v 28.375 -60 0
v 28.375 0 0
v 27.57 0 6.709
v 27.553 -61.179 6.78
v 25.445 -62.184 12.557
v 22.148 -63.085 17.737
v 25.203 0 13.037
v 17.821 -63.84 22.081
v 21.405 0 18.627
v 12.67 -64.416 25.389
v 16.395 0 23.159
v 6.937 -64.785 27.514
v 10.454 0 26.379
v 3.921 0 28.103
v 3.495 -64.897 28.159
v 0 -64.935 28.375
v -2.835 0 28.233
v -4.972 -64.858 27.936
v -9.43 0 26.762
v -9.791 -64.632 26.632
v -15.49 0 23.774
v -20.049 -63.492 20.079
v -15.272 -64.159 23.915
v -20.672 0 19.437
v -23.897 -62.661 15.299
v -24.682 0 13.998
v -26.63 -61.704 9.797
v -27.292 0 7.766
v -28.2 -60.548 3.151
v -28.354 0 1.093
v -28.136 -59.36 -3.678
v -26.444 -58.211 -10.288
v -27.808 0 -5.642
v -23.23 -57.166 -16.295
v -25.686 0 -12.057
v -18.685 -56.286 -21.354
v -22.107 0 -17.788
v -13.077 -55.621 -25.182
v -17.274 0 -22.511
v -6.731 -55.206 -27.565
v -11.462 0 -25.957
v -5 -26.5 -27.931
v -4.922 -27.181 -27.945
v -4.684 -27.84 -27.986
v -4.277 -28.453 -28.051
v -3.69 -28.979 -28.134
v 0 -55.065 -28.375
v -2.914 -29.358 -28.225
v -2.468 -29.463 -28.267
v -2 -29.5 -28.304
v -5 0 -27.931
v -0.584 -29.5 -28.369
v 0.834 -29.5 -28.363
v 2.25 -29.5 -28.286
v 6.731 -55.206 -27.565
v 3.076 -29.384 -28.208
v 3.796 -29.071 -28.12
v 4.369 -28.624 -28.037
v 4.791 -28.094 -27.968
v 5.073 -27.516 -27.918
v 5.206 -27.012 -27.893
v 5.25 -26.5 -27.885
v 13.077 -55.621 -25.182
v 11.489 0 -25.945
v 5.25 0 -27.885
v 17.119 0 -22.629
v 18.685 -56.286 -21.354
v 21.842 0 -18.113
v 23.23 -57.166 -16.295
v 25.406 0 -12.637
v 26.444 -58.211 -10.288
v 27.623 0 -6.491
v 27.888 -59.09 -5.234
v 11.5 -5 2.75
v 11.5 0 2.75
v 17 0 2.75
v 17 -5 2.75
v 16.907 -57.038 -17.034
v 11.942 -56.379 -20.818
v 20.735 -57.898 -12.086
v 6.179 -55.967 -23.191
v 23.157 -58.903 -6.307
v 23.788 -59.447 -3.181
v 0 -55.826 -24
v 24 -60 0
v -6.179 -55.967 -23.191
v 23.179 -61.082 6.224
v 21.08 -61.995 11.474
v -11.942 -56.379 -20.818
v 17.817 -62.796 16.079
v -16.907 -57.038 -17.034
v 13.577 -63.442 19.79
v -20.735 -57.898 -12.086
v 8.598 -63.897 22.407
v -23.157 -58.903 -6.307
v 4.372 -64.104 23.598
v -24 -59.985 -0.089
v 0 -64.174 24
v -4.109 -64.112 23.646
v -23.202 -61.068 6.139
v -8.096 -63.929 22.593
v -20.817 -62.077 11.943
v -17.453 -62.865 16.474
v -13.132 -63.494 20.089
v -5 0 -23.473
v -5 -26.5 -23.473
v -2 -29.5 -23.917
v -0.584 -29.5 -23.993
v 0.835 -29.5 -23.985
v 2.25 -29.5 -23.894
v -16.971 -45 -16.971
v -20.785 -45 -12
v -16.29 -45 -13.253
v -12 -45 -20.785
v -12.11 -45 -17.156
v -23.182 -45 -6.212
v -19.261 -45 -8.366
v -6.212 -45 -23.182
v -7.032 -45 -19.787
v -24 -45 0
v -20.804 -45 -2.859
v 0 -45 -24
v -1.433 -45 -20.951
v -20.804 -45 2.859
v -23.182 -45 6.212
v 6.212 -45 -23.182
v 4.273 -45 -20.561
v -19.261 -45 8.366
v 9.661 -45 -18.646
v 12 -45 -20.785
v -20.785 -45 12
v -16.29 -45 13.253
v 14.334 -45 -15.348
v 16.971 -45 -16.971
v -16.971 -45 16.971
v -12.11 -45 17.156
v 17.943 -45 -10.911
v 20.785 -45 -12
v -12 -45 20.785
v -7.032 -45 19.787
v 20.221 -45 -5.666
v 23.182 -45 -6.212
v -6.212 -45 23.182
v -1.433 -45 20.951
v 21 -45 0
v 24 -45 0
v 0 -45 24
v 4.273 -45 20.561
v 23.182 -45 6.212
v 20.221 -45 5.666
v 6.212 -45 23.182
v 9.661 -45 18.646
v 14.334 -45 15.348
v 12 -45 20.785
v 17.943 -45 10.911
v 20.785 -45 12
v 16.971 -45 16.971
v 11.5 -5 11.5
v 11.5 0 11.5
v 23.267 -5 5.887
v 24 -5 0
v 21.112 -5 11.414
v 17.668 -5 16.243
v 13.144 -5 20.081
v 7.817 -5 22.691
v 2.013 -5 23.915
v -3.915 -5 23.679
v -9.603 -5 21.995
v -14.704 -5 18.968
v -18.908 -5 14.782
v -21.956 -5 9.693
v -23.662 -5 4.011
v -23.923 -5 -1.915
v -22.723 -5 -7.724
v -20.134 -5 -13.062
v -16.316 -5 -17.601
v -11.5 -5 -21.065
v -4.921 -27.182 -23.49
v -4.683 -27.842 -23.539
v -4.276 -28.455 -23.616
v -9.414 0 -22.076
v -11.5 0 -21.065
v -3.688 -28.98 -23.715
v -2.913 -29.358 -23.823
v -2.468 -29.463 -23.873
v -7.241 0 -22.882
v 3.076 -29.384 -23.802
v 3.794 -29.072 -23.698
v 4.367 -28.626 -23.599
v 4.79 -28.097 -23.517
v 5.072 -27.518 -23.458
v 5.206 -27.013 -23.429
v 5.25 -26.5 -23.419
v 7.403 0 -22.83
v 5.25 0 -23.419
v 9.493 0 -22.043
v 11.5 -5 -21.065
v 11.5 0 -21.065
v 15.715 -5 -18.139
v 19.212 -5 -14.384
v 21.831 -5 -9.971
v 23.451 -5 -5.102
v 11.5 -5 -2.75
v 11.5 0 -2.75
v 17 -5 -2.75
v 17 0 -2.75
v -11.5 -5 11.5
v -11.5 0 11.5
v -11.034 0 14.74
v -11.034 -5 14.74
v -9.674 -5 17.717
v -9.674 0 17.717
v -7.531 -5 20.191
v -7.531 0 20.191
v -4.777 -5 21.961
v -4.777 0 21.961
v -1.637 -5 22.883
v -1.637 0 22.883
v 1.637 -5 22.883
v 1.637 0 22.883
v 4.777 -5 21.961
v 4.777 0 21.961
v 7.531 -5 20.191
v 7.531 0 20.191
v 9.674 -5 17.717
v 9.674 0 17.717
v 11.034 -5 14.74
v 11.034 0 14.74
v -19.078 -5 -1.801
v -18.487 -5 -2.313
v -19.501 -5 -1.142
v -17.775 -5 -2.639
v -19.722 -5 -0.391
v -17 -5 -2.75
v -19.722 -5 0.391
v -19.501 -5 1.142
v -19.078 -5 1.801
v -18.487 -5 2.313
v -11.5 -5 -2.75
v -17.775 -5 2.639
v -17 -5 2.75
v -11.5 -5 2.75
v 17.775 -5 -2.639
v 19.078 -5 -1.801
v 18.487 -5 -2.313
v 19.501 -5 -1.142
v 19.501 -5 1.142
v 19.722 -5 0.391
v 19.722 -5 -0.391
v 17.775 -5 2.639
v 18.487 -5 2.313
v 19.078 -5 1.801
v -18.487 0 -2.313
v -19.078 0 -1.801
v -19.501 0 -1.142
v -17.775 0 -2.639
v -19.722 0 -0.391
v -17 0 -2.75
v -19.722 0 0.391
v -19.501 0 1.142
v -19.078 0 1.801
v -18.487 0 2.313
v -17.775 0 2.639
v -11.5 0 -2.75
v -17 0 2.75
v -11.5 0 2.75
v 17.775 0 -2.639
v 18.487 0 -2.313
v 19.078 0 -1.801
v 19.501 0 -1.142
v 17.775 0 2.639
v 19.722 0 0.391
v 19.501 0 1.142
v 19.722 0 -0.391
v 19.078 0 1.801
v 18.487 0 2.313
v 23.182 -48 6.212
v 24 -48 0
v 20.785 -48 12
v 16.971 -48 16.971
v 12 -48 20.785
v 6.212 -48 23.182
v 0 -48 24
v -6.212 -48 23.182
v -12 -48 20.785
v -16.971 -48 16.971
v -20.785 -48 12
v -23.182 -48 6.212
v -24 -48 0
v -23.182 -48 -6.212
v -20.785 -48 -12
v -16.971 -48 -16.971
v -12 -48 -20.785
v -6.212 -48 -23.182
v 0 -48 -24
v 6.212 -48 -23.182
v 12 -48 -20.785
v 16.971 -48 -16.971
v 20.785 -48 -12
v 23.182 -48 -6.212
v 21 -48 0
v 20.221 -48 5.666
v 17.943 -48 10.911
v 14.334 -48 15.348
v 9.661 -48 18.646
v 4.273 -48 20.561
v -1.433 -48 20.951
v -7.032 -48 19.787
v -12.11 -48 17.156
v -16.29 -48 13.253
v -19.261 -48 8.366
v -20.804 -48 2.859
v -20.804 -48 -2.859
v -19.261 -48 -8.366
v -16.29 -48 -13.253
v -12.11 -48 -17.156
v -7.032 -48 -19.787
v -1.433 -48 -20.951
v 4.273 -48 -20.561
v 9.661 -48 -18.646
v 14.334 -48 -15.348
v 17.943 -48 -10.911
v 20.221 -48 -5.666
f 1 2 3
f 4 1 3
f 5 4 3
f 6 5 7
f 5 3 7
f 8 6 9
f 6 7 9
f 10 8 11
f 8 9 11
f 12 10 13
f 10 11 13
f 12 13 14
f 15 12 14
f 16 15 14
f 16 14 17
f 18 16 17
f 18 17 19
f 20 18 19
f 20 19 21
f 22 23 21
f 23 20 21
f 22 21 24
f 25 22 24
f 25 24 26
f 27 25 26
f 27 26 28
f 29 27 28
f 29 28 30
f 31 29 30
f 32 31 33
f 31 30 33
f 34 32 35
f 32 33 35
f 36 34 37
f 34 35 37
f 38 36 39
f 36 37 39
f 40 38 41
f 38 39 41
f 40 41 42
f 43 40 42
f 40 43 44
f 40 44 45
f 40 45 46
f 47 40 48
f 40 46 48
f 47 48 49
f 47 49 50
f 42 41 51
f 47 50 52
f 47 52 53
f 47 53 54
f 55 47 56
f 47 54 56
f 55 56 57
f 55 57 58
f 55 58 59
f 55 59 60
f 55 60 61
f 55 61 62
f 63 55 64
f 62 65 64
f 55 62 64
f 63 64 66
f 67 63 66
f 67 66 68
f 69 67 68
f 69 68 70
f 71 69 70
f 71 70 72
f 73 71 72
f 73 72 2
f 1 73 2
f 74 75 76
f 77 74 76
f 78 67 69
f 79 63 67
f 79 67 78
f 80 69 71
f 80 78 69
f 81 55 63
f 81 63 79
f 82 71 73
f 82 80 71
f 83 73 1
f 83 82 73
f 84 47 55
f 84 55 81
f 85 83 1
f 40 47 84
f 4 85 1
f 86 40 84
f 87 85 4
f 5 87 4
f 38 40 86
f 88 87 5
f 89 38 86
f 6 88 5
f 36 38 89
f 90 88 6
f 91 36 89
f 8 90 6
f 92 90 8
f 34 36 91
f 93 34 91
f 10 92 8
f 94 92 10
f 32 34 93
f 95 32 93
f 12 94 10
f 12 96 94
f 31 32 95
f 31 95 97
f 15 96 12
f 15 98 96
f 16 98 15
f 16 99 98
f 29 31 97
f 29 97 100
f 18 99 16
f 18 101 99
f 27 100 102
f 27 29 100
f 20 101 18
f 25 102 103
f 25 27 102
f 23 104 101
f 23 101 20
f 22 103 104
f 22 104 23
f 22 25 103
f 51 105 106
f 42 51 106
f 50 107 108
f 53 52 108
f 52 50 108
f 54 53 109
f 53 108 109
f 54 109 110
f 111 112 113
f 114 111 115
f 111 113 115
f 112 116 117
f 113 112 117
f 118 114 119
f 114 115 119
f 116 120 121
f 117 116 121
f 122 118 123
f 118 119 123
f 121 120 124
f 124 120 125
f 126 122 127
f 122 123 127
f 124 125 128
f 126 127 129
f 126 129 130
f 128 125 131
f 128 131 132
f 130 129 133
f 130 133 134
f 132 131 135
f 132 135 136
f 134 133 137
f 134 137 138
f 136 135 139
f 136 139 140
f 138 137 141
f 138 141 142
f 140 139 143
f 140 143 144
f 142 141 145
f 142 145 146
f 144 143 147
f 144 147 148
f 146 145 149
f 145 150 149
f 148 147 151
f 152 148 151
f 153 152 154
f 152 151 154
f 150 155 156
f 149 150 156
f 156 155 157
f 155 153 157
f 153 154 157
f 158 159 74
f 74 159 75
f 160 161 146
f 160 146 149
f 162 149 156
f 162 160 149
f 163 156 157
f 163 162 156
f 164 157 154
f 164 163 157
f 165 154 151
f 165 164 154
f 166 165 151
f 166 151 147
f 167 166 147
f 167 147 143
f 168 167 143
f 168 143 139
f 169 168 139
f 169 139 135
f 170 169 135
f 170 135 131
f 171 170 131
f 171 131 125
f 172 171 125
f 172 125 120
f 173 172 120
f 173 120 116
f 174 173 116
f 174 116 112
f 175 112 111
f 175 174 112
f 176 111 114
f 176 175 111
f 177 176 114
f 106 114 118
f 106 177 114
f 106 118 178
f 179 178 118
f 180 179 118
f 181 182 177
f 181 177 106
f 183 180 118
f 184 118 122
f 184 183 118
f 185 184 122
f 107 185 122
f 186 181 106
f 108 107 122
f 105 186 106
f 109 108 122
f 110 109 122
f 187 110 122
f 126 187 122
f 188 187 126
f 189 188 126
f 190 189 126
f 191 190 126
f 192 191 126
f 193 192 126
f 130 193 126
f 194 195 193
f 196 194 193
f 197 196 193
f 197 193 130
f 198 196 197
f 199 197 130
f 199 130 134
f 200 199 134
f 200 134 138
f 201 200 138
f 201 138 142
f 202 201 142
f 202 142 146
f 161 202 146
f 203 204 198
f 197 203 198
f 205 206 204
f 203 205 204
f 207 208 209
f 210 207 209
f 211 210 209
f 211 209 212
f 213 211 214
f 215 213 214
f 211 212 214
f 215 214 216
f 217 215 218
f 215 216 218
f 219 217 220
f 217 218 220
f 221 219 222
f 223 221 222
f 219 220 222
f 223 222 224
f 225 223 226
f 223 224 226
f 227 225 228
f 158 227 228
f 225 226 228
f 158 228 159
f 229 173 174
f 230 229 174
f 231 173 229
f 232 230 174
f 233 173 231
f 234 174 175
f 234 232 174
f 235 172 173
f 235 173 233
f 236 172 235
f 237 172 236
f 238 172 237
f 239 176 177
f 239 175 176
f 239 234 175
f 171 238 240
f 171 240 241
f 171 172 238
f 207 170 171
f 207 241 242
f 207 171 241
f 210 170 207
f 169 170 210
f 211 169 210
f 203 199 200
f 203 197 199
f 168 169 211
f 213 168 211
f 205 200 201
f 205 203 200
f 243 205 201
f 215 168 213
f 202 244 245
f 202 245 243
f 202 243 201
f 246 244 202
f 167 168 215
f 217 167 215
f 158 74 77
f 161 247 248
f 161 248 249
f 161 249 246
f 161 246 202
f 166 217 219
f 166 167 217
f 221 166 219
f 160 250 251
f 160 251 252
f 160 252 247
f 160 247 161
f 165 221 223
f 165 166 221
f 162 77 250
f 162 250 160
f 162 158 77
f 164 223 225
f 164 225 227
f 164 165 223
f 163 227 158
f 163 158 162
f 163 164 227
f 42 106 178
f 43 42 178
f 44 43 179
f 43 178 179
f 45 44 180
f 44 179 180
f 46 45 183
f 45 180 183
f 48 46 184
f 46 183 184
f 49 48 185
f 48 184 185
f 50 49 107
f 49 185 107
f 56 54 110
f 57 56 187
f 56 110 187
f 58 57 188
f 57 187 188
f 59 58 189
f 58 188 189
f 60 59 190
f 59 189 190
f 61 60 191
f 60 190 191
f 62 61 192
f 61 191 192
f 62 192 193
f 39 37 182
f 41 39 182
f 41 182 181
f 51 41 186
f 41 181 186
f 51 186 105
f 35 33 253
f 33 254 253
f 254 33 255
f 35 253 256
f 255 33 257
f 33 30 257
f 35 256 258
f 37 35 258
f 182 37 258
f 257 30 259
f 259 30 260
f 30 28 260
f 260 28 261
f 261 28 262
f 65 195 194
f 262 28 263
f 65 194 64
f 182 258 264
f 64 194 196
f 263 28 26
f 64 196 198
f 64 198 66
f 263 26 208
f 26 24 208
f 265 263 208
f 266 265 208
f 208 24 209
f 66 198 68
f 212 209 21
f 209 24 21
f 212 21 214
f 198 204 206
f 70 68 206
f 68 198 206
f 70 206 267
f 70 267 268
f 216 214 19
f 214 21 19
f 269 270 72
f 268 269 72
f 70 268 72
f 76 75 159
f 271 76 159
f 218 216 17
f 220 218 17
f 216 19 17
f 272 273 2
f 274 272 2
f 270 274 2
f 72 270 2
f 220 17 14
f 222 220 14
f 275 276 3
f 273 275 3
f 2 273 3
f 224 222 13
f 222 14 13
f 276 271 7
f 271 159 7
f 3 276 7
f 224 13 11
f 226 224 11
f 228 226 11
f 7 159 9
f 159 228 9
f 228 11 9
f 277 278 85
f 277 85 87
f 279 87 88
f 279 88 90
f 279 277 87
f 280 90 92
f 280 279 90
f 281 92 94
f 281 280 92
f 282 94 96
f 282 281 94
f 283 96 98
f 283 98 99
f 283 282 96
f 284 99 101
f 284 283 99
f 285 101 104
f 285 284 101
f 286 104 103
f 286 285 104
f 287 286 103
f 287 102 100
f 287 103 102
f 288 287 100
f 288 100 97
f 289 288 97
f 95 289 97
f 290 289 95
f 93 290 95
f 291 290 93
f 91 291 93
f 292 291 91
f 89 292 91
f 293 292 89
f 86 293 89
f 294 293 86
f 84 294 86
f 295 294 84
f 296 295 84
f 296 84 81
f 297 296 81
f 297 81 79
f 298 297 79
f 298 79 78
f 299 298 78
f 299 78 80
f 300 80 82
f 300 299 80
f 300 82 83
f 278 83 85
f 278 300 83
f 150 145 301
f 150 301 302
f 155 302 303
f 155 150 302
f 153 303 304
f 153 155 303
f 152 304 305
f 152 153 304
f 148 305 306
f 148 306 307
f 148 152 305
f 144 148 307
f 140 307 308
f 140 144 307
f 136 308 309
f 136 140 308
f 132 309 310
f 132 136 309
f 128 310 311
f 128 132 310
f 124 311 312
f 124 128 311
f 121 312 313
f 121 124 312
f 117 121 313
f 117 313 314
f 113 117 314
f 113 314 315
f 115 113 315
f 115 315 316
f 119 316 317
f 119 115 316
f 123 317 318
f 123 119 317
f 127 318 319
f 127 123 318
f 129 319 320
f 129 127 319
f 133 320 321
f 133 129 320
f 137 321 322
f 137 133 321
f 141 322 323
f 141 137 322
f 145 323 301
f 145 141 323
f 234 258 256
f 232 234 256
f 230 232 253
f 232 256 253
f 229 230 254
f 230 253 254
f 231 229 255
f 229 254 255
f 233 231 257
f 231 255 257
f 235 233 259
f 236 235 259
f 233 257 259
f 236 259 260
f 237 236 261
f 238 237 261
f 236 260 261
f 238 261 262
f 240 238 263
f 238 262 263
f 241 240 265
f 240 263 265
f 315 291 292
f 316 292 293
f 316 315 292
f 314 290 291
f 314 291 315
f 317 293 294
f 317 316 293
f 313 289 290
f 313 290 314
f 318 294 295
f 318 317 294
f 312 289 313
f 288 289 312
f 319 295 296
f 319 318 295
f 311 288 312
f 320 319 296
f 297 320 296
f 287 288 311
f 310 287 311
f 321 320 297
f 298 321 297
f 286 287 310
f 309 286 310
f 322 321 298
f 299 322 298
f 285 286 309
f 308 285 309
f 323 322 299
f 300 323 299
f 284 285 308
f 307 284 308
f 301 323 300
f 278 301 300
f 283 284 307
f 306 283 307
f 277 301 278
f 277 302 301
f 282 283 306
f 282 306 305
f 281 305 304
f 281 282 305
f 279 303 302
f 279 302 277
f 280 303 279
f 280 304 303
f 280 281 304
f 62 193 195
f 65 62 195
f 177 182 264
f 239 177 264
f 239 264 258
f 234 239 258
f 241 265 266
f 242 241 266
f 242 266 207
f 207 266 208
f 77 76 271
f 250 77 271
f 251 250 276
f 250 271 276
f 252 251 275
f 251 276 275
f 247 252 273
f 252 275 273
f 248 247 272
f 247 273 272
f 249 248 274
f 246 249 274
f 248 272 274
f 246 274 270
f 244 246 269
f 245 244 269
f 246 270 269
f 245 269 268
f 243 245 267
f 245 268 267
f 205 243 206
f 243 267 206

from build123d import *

# Parameters (mm, degrees)
F0_R          = 28.375
F0_R_2        = 24
F1_DEPTH      = 65
F3_DEPTH      = 35
F3_DEPTH_BACK = 35
F5_DEPTH      = 35
F7_DEPTH      = 5
F9_DEPTH      = 25
F11_R         = 24
F11_R_2       = 21
F12_DEPTH     = 3


with BuildPart() as f1:
    # F0 (on Front) → F1 (new body)
    with BuildSketch(Plane.XZ):
        Circle(F0_R)
        Circle(F0_R_2, mode=Mode.SUBTRACT)
    extrude(amount=F1_DEPTH)

    # F2 (on Right) → F3 (cut, two sides)
    with BuildSketch(Plane.YZ) as f3_sk:
        Polygon((-55, -28.75), (-65, 28.75), (-65, -28.75), align=None)
    extrude(amount=F3_DEPTH, mode=Mode.SUBTRACT)
    extrude(f3_sk.sketch, amount=-F3_DEPTH_BACK, mode=Mode.SUBTRACT)

    # F4 (on Top) → F5 (cut)
    with BuildSketch(Plane.XY):
        with BuildLine():
            Line((5.25, 0), (-5, 0))
            Line((-5, 0), (-5, -26.5))
            ThreePointArc((-5, -26.5), (-4.12132, -28.62132), (-2, -29.5))
            Line((-2, -29.5), (2.25, -29.5))
            ThreePointArc((2.25, -29.5), (4.37132, -28.62132), (5.25, -26.5))
            Line((5.25, -26.5), (5.25, 0))
        make_face()
    extrude(amount=-F5_DEPTH, mode=Mode.SUBTRACT)

    # F6 (on Front) → F7 (join)
    with BuildSketch(Plane.XZ):
        with BuildLine():
            Line((11.5, 11.5), (11.5, -25.529395))
            ThreePointArc((11.5, -25.529395), (0, 28), (-11.5, -25.529395))
            Line((-11.5, -25.529395), (-11.5, 11.5))
            ThreePointArc((-11.5, 11.5), (0, 23), (11.5, 11.5))
        make_face()
    extrude(amount=F7_DEPTH)

    # F8 (on face) → F9 (cut)
    with BuildSketch(Plane(origin=(0, 0, 0), x_dir=(-1, 0, 0), z_dir=(0, 1, 0))):
        with BuildLine():
            Line((-17, -2.75), (-10, -2.75))
            ThreePointArc((-10, -2.75), (-7.25, 0), (-10, 2.75))
            Line((-10, 2.75), (-17, 2.75))
            ThreePointArc((-17, 2.75), (-19.75, 0), (-17, -2.75))
        make_face()
        with BuildLine():
            Line((17, 2.75), (10, 2.75))
            ThreePointArc((10, 2.75), (7.25, 0), (10, -2.75))
            Line((10, -2.75), (17, -2.75))
            ThreePointArc((17, -2.75), (19.75, 0), (17, 2.75))
        make_face()
    extrude(amount=-F9_DEPTH, mode=Mode.SUBTRACT)

    # F11 (on offset) → F12 (join)
    with BuildSketch(Plane.XZ.offset(45)):
        Circle(F11_R)
        Circle(F11_R_2, mode=Mode.SUBTRACT)
    extrude(amount=F12_DEPTH)


solid = f1.part
